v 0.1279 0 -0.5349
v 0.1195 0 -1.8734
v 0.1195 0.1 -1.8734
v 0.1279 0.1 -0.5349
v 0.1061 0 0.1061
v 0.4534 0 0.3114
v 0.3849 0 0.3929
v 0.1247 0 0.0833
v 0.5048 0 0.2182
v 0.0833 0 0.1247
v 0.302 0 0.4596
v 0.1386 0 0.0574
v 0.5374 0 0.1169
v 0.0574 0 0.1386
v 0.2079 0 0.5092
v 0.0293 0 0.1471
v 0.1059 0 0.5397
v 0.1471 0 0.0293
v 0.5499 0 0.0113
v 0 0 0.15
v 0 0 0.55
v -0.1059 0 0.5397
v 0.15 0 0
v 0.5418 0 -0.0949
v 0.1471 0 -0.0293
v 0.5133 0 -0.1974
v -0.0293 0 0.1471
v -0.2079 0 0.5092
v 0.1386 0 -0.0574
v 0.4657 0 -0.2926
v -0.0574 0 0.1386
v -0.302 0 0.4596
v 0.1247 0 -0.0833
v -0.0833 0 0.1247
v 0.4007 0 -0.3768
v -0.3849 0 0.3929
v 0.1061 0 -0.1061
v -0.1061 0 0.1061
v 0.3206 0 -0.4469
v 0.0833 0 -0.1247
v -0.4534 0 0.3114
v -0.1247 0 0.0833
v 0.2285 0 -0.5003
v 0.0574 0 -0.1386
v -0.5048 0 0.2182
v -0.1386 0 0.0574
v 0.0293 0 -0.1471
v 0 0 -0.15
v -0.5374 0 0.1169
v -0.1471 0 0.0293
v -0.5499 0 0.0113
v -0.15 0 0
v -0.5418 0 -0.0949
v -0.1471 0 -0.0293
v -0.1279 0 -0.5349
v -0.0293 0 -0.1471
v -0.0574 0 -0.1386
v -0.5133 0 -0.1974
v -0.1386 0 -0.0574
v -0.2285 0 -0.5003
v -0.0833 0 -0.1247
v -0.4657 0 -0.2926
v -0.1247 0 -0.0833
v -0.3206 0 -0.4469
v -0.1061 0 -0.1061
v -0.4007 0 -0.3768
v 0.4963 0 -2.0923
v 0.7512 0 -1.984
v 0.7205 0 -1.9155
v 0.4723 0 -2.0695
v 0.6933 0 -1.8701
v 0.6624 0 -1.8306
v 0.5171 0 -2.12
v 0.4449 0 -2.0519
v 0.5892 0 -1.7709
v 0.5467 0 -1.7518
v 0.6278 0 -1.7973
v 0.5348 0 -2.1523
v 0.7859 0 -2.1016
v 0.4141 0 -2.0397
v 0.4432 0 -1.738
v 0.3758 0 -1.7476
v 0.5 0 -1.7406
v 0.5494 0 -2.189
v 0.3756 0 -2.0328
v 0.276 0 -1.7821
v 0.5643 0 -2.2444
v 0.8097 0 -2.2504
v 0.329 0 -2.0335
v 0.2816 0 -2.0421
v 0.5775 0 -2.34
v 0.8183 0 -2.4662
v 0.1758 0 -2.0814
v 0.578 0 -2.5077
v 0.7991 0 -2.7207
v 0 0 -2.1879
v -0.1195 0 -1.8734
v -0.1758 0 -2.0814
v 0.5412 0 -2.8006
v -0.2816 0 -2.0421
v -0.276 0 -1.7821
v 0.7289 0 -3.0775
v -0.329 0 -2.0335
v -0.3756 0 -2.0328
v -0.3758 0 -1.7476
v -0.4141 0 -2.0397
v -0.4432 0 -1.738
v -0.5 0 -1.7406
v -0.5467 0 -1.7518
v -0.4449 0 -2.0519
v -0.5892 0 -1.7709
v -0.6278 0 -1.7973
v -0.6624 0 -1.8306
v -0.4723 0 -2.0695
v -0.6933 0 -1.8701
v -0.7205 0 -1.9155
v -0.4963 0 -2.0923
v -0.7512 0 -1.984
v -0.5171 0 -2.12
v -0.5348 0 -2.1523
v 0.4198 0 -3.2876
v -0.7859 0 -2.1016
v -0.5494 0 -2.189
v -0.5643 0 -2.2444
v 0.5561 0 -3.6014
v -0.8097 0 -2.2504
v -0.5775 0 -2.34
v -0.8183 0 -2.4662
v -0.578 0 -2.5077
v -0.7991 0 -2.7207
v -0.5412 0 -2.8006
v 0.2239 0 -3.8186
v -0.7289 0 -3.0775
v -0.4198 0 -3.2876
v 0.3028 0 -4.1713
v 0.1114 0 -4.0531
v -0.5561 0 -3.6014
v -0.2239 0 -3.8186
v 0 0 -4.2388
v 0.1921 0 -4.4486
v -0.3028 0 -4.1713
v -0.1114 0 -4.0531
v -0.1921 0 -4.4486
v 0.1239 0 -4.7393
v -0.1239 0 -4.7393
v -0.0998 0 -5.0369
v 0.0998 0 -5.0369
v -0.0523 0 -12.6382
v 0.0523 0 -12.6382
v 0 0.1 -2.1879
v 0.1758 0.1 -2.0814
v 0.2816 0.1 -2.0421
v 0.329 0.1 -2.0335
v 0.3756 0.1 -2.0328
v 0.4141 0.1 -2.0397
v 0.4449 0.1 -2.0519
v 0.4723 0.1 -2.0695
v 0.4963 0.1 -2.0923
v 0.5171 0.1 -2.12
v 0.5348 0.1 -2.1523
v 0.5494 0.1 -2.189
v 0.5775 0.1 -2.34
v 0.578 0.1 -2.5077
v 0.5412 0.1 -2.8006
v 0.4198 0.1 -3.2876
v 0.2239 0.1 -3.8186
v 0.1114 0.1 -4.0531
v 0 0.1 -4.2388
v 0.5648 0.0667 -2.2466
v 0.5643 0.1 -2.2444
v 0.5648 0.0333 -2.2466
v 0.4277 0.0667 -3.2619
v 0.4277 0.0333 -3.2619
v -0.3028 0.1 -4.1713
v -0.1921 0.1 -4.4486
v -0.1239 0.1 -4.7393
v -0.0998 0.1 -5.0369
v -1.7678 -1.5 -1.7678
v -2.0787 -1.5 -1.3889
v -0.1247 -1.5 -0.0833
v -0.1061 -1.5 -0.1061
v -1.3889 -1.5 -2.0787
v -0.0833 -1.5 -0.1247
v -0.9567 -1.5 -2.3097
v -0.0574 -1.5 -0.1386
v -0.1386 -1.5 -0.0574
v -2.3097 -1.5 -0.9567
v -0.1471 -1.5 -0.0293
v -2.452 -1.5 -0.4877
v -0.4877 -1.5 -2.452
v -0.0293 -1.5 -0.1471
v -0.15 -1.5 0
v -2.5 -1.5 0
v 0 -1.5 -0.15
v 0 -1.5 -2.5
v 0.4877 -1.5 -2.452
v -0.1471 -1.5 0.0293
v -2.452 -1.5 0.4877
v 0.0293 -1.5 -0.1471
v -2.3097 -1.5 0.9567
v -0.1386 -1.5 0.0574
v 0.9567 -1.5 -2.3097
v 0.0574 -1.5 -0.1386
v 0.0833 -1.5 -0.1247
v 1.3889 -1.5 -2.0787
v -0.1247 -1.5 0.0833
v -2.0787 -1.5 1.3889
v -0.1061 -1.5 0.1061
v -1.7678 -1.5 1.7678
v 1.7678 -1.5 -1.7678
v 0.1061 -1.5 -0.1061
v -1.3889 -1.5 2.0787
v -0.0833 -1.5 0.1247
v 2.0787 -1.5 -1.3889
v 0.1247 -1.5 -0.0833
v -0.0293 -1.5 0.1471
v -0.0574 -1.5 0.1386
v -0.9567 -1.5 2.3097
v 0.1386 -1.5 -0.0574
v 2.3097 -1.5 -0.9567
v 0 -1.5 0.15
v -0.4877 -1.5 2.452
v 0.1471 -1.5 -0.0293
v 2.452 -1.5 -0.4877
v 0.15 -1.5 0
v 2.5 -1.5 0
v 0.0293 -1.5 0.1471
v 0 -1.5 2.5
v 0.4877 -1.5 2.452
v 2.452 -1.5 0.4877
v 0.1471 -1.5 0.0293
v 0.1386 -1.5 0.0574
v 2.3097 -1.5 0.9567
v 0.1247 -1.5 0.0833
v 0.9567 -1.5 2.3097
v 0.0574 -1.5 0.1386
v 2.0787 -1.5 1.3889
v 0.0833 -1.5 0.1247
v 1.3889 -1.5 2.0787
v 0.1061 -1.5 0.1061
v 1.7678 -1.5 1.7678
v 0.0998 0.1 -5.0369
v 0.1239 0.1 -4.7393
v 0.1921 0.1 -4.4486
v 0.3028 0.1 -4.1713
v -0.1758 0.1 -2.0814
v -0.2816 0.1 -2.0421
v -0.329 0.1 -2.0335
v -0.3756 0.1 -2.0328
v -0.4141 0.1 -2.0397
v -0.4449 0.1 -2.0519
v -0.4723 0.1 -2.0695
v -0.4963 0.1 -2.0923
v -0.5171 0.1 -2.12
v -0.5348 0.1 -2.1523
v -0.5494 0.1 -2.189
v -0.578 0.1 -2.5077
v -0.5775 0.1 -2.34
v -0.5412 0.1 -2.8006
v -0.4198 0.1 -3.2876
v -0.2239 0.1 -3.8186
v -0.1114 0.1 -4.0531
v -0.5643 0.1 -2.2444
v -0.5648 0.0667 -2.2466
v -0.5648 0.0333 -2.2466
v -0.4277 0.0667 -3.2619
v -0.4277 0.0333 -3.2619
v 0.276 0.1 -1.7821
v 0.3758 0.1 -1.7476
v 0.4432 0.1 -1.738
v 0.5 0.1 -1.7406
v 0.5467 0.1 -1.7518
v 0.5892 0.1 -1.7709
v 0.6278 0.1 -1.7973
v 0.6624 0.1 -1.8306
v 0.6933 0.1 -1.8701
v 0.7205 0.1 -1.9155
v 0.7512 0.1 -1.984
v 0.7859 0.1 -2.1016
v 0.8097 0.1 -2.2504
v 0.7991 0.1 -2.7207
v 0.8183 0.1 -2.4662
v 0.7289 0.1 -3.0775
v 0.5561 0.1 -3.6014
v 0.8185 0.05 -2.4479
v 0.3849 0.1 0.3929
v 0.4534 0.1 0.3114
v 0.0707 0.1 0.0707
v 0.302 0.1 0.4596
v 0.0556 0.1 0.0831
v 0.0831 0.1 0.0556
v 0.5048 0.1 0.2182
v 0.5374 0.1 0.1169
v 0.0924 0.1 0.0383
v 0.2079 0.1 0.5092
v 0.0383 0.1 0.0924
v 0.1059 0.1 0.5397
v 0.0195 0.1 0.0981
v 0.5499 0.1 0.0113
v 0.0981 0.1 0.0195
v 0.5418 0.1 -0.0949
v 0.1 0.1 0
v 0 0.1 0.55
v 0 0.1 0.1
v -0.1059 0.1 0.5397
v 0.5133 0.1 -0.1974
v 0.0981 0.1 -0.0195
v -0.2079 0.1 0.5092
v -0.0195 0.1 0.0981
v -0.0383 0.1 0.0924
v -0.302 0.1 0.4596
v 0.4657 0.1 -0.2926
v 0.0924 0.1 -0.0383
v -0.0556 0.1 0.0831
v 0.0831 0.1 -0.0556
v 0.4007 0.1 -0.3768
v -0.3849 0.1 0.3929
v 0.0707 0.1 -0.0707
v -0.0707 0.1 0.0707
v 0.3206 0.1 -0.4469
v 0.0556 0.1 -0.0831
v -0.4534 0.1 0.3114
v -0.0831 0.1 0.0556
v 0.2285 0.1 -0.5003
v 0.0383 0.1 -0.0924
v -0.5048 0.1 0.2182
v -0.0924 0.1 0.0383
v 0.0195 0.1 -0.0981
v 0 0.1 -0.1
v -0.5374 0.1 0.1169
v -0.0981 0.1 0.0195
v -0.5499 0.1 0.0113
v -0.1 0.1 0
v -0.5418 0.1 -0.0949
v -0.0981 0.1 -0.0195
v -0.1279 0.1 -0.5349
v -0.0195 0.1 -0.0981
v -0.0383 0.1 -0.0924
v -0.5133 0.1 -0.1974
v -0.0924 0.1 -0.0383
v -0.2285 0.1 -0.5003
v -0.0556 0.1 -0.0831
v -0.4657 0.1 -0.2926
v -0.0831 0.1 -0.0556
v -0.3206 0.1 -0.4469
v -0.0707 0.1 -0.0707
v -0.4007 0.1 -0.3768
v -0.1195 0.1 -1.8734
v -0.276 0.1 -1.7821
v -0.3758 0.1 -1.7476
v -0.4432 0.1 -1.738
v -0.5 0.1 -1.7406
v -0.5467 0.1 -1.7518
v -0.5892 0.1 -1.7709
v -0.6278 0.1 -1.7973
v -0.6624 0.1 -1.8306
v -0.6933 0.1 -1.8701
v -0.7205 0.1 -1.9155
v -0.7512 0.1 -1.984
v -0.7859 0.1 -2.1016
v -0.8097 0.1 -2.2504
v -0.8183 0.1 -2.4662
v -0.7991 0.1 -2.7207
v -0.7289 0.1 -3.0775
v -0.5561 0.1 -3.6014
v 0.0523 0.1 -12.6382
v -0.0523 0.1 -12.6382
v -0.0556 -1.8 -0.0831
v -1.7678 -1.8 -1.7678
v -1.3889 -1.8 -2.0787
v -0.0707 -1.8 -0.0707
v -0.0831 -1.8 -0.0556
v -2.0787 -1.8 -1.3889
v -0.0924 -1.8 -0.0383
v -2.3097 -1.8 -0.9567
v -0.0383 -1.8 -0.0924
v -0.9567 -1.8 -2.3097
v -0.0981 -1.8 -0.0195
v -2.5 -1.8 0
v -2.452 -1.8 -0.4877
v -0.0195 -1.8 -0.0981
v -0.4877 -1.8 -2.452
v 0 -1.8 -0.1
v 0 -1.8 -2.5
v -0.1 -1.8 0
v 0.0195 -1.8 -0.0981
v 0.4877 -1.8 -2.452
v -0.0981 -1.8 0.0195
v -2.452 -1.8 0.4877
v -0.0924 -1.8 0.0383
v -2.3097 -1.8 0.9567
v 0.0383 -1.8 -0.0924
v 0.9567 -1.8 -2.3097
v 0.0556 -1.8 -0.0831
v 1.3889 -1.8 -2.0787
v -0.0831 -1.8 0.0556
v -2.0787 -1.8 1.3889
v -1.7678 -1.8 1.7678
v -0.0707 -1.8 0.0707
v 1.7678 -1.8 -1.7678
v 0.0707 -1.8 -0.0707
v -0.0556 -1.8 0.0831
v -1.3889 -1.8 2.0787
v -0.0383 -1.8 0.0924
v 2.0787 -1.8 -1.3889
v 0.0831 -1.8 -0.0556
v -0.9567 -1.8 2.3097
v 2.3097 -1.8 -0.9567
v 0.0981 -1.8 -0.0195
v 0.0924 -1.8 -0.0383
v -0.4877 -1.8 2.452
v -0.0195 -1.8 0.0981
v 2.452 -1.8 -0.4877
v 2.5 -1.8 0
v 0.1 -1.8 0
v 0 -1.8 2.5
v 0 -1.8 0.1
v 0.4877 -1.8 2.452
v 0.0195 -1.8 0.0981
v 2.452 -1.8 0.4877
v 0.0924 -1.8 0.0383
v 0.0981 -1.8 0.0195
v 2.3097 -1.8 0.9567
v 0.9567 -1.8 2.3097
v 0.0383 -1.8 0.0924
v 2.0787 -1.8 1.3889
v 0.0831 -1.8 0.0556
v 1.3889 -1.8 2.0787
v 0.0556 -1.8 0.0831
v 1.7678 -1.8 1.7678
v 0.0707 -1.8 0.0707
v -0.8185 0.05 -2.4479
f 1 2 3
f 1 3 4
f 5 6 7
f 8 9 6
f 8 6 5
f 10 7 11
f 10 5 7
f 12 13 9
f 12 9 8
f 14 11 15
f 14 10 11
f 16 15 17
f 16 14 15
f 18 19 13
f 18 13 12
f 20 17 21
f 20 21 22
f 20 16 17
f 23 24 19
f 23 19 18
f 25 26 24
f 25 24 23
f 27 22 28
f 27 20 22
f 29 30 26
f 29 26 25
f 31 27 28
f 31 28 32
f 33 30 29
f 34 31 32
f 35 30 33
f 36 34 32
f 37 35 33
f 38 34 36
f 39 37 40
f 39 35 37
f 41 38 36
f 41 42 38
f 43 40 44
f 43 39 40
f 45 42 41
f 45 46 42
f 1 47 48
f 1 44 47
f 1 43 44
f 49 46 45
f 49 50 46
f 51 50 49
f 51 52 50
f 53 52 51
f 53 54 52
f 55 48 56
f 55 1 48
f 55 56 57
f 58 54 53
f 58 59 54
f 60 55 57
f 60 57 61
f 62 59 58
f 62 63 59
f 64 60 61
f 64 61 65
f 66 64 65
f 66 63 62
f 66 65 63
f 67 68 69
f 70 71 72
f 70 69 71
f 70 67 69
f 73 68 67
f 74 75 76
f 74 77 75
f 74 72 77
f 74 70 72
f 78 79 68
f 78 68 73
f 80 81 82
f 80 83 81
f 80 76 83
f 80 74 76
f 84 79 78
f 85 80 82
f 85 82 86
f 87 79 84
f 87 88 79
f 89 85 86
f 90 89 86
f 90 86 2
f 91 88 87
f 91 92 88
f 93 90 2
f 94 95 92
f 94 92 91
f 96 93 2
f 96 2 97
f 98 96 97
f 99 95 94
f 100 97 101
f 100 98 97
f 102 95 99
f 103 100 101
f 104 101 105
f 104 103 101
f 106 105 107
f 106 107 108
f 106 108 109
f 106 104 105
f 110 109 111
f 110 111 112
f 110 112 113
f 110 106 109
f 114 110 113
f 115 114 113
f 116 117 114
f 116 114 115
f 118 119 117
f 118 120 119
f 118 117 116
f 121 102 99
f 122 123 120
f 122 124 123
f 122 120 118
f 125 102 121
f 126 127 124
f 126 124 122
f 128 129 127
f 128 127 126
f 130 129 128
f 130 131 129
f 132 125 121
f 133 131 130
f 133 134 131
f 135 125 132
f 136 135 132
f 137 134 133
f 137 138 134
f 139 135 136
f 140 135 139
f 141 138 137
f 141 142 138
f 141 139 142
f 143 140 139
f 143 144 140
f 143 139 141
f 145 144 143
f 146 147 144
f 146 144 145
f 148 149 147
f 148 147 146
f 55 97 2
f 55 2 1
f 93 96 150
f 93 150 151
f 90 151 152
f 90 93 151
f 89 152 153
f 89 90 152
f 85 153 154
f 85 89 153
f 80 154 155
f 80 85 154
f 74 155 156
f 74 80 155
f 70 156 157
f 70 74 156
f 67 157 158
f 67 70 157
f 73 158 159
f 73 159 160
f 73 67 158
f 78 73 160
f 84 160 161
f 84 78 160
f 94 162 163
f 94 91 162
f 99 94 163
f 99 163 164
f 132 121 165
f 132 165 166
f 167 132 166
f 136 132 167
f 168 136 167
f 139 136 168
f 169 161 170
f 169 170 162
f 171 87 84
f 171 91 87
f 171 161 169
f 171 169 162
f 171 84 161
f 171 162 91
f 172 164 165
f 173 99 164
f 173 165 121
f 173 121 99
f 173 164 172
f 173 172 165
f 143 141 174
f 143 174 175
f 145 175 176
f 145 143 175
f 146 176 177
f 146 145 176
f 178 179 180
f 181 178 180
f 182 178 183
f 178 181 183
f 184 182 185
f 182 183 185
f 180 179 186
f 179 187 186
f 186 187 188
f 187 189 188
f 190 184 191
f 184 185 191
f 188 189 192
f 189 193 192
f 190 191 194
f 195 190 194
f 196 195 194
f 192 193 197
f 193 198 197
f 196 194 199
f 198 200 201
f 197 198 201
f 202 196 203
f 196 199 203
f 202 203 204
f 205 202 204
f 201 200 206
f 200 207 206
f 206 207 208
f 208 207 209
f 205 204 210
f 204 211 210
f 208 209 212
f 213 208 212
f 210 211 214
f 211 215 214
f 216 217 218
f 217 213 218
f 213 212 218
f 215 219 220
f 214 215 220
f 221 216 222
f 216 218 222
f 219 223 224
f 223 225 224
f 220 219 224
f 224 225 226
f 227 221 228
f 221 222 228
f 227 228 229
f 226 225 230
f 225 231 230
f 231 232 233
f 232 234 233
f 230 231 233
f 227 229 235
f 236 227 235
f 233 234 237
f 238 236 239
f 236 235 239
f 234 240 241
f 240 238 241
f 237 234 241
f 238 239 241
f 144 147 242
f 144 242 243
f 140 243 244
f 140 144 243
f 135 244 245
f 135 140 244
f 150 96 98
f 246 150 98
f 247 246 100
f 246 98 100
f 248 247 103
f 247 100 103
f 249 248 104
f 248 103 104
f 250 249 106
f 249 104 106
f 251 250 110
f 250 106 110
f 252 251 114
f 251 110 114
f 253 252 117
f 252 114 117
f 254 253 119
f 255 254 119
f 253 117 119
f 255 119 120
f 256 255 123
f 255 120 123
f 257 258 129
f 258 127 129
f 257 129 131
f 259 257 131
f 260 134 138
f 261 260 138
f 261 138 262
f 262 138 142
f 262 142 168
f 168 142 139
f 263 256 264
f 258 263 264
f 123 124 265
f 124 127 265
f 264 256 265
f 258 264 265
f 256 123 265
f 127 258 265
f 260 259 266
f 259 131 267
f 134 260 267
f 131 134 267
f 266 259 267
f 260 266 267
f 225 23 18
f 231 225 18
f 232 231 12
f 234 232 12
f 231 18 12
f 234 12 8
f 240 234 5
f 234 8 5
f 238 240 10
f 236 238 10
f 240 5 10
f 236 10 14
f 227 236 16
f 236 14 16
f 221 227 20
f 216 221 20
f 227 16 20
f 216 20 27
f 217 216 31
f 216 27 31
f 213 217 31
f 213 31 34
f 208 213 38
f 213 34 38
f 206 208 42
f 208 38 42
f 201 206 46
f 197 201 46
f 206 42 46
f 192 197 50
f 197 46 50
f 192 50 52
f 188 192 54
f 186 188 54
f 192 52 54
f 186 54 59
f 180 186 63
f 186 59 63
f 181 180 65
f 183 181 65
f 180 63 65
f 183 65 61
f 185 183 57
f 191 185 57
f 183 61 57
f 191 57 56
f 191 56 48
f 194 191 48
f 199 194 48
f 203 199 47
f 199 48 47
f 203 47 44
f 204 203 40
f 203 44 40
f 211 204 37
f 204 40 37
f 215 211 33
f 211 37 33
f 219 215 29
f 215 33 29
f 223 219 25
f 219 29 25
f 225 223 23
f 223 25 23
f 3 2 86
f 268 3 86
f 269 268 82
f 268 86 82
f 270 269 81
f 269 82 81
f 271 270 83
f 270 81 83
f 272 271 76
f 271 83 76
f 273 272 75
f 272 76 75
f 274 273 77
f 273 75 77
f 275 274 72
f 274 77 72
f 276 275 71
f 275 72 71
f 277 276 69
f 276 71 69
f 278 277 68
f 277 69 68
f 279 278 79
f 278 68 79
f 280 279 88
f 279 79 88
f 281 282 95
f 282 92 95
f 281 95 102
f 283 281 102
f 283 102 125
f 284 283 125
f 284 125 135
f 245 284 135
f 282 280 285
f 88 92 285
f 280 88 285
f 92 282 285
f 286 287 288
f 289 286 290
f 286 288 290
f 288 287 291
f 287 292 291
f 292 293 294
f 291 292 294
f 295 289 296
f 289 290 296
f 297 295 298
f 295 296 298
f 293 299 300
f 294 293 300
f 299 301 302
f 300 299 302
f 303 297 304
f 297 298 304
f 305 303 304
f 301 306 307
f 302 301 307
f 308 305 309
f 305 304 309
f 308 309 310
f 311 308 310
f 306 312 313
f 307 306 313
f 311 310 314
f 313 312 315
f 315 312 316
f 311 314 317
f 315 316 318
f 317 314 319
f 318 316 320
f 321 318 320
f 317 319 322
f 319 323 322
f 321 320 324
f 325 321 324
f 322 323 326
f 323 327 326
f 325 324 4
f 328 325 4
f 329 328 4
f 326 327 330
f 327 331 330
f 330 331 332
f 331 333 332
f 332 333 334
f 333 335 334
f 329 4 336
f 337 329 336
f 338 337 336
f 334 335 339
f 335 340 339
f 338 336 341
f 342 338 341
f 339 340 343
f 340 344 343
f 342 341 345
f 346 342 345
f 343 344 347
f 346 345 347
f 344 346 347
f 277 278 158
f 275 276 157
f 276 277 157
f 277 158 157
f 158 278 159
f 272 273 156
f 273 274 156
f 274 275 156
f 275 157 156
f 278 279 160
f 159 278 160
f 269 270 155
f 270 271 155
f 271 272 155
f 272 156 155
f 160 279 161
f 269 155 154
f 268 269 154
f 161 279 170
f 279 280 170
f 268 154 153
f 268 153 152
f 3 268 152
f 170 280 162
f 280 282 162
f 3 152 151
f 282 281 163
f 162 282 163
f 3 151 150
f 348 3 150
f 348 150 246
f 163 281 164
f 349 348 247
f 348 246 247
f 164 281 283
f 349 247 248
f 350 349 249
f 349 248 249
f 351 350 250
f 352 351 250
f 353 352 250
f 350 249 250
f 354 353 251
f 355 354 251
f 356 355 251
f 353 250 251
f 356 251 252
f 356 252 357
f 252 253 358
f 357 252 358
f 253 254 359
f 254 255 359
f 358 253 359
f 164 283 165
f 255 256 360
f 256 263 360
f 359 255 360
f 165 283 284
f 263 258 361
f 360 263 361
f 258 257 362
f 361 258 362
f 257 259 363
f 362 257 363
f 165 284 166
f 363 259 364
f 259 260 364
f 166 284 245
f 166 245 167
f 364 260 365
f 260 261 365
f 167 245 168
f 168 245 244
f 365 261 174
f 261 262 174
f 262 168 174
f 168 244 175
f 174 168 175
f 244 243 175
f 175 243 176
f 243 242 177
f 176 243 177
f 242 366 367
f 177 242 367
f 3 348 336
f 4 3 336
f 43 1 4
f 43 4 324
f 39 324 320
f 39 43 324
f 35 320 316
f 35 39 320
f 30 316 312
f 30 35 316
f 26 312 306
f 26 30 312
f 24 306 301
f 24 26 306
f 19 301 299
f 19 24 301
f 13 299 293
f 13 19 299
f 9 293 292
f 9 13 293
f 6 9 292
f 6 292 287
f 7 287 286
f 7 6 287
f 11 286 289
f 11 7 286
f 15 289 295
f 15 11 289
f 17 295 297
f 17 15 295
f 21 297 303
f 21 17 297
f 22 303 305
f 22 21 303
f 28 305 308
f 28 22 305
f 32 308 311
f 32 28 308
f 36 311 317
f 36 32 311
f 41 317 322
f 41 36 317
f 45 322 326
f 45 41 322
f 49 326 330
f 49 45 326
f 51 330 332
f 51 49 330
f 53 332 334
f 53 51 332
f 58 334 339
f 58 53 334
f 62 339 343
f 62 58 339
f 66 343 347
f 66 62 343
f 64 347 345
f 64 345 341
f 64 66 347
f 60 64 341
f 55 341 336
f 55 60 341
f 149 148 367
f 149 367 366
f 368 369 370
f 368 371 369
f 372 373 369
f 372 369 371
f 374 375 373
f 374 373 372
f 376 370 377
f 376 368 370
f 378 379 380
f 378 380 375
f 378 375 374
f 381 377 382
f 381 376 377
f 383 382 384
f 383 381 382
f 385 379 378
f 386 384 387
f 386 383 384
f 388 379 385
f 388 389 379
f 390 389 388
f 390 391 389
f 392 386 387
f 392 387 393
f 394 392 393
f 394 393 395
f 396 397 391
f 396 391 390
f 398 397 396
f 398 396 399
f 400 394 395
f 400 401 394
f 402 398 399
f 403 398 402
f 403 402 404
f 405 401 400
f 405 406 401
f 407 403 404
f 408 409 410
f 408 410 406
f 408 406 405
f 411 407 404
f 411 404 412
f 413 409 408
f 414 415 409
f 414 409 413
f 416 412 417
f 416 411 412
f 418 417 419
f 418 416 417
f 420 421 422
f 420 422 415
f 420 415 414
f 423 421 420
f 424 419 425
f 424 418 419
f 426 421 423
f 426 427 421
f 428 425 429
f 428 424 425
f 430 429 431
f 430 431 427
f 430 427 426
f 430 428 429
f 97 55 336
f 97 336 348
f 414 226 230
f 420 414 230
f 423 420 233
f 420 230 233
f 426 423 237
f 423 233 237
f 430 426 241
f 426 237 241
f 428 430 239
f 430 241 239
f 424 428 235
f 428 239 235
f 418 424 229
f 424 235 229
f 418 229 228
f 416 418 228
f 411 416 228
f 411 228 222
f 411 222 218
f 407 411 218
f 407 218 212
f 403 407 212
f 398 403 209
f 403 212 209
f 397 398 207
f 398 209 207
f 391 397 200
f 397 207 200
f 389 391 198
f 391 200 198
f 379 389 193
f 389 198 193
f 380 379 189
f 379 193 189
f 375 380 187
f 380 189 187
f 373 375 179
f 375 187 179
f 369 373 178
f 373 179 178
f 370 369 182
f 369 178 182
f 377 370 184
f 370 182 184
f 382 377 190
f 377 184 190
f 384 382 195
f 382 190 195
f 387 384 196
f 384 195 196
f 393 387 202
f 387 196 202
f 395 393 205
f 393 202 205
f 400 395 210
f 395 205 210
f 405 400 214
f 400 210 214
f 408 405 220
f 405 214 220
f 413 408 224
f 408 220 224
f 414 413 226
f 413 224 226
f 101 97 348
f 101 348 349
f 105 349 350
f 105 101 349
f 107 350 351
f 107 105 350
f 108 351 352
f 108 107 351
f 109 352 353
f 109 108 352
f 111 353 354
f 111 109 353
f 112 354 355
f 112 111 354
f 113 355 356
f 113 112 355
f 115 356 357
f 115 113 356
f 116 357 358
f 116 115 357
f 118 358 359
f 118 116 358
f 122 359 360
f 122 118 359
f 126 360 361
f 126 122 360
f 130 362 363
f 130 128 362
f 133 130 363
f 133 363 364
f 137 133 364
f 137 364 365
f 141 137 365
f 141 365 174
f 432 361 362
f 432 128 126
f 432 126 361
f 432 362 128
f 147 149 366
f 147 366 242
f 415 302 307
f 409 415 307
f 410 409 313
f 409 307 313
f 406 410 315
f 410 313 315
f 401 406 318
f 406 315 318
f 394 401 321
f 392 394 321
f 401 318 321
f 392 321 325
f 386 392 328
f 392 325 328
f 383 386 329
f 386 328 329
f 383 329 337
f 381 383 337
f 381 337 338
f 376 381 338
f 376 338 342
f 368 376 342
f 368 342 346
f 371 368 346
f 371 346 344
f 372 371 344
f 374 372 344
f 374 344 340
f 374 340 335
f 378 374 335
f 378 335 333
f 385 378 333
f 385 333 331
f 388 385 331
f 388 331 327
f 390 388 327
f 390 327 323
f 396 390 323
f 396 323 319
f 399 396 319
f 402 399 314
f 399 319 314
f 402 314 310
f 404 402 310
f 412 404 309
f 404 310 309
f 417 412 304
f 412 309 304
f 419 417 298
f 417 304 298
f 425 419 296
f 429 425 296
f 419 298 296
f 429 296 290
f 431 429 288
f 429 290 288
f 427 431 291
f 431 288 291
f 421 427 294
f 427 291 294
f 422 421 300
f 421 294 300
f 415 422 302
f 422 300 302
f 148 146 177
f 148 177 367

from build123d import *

# Parameters (mm, degrees)
BOSS_EXTRUDE1_DEPTH = 0.1
SKETCH2_R           = 0.15
BOSS_EXTRUDE2_DEPTH = 1.5
SKETCH3_R           = 2.5
BOSS_EXTRUDE3_DEPTH = 0.3
SKETCH4_R           = 0.1
CUT_EXTRUDE1_DEPTH  = 2.9


with BuildPart() as part:
    # Sketch1 → Boss-Extrude1 (new body)
    with BuildSketch(Plane(origin=(0, 0, 0), x_dir=(1, 0, 0), z_dir=(0, 1, 0))):
        with BuildLine():
            Line((-0.127906747, 0.534920428), (-0.119541068, 1.873429083))
            add(Edge.make_bspline(
                [(-0.119541068, 1.873429083), (-0.641060696, 1.506237283), (-1.004261291, 2.385988304), (-0.624353855, 3.513359347), (-0.302826258, 4.171285989)],
                knots=[0, 0, 0, 0, 0.462172684, 0.924345367, 0.924345367, 0.924345367, 0.924345367], degree=3))
            ThreePointArc((-0.302826258, 4.171285989), (-0.152583372, 4.592680906), (-0.099769187, 5.036930007))
            Line((-0.099769187, 5.036930007), (-0.052260994, 12.638240889))
            Line((-0.052260994, 12.638240889), (0.052260994, 12.638240889))
            Line((0.052260994, 12.638240889), (0.099769187, 5.036930007))
            ThreePointArc((0.099769187, 5.036930007), (0.152583372, 4.592680906), (0.302826258, 4.171285989))
            add(Edge.make_bspline(
                [(0.119541068, 1.873429083), (0.641060696, 1.506237283), (1.004261291, 2.385988304), (0.624353855, 3.513359347), (0.302826258, 4.171285989)],
                knots=[0, 0, 0, 0, 0.462172684, 0.924345367, 0.924345367, 0.924345367, 0.924345367], degree=3))
            Line((0.119541068, 1.873429083), (0.127906747, 0.534920428))
            ThreePointArc((0.127906747, 0.534920428), (0, -0.55), (-0.127906747, 0.534920428))
        make_face()
        with BuildLine():
            add(Edge.make_bspline(
                [(0, 2.187874242), (-1.052874031, 1.436460782), (-0.435783261, 3.612960551), (0, 4.238807322)],
                knots=[0, 0, 0, 0, 1, 1, 1, 1], degree=3))
            add(Edge.make_bspline(
                [(0, 2.187874242), (1.052874031, 1.436460782), (0.435783261, 3.612960551), (0, 4.238807322)],
                knots=[0, 0, 0, 0, 1, 1, 1, 1], degree=3))
        make_face(mode=Mode.SUBTRACT)
    extrude(amount=BOSS_EXTRUDE1_DEPTH)

    # Sketch2 → Boss-Extrude2 (add)
    with BuildSketch(Plane.XZ):
        Circle(SKETCH2_R)
    extrude(amount=BOSS_EXTRUDE2_DEPTH)

    # Sketch3 → Boss-Extrude3 (add)
    with BuildSketch(Plane.XZ.offset(1.5)):
        Circle(SKETCH3_R)
    extrude(amount=BOSS_EXTRUDE3_DEPTH)

    # Sketch4 → Cut-Extrude1 (cut, through all)
    with BuildSketch(Plane(origin=(0, 0.1, 0), x_dir=(1, 0, 0), z_dir=(0, 1, 0))):
        Circle(SKETCH4_R)
    extrude(amount=-CUT_EXTRUDE1_DEPTH, mode=Mode.SUBTRACT)


solid = part.part
